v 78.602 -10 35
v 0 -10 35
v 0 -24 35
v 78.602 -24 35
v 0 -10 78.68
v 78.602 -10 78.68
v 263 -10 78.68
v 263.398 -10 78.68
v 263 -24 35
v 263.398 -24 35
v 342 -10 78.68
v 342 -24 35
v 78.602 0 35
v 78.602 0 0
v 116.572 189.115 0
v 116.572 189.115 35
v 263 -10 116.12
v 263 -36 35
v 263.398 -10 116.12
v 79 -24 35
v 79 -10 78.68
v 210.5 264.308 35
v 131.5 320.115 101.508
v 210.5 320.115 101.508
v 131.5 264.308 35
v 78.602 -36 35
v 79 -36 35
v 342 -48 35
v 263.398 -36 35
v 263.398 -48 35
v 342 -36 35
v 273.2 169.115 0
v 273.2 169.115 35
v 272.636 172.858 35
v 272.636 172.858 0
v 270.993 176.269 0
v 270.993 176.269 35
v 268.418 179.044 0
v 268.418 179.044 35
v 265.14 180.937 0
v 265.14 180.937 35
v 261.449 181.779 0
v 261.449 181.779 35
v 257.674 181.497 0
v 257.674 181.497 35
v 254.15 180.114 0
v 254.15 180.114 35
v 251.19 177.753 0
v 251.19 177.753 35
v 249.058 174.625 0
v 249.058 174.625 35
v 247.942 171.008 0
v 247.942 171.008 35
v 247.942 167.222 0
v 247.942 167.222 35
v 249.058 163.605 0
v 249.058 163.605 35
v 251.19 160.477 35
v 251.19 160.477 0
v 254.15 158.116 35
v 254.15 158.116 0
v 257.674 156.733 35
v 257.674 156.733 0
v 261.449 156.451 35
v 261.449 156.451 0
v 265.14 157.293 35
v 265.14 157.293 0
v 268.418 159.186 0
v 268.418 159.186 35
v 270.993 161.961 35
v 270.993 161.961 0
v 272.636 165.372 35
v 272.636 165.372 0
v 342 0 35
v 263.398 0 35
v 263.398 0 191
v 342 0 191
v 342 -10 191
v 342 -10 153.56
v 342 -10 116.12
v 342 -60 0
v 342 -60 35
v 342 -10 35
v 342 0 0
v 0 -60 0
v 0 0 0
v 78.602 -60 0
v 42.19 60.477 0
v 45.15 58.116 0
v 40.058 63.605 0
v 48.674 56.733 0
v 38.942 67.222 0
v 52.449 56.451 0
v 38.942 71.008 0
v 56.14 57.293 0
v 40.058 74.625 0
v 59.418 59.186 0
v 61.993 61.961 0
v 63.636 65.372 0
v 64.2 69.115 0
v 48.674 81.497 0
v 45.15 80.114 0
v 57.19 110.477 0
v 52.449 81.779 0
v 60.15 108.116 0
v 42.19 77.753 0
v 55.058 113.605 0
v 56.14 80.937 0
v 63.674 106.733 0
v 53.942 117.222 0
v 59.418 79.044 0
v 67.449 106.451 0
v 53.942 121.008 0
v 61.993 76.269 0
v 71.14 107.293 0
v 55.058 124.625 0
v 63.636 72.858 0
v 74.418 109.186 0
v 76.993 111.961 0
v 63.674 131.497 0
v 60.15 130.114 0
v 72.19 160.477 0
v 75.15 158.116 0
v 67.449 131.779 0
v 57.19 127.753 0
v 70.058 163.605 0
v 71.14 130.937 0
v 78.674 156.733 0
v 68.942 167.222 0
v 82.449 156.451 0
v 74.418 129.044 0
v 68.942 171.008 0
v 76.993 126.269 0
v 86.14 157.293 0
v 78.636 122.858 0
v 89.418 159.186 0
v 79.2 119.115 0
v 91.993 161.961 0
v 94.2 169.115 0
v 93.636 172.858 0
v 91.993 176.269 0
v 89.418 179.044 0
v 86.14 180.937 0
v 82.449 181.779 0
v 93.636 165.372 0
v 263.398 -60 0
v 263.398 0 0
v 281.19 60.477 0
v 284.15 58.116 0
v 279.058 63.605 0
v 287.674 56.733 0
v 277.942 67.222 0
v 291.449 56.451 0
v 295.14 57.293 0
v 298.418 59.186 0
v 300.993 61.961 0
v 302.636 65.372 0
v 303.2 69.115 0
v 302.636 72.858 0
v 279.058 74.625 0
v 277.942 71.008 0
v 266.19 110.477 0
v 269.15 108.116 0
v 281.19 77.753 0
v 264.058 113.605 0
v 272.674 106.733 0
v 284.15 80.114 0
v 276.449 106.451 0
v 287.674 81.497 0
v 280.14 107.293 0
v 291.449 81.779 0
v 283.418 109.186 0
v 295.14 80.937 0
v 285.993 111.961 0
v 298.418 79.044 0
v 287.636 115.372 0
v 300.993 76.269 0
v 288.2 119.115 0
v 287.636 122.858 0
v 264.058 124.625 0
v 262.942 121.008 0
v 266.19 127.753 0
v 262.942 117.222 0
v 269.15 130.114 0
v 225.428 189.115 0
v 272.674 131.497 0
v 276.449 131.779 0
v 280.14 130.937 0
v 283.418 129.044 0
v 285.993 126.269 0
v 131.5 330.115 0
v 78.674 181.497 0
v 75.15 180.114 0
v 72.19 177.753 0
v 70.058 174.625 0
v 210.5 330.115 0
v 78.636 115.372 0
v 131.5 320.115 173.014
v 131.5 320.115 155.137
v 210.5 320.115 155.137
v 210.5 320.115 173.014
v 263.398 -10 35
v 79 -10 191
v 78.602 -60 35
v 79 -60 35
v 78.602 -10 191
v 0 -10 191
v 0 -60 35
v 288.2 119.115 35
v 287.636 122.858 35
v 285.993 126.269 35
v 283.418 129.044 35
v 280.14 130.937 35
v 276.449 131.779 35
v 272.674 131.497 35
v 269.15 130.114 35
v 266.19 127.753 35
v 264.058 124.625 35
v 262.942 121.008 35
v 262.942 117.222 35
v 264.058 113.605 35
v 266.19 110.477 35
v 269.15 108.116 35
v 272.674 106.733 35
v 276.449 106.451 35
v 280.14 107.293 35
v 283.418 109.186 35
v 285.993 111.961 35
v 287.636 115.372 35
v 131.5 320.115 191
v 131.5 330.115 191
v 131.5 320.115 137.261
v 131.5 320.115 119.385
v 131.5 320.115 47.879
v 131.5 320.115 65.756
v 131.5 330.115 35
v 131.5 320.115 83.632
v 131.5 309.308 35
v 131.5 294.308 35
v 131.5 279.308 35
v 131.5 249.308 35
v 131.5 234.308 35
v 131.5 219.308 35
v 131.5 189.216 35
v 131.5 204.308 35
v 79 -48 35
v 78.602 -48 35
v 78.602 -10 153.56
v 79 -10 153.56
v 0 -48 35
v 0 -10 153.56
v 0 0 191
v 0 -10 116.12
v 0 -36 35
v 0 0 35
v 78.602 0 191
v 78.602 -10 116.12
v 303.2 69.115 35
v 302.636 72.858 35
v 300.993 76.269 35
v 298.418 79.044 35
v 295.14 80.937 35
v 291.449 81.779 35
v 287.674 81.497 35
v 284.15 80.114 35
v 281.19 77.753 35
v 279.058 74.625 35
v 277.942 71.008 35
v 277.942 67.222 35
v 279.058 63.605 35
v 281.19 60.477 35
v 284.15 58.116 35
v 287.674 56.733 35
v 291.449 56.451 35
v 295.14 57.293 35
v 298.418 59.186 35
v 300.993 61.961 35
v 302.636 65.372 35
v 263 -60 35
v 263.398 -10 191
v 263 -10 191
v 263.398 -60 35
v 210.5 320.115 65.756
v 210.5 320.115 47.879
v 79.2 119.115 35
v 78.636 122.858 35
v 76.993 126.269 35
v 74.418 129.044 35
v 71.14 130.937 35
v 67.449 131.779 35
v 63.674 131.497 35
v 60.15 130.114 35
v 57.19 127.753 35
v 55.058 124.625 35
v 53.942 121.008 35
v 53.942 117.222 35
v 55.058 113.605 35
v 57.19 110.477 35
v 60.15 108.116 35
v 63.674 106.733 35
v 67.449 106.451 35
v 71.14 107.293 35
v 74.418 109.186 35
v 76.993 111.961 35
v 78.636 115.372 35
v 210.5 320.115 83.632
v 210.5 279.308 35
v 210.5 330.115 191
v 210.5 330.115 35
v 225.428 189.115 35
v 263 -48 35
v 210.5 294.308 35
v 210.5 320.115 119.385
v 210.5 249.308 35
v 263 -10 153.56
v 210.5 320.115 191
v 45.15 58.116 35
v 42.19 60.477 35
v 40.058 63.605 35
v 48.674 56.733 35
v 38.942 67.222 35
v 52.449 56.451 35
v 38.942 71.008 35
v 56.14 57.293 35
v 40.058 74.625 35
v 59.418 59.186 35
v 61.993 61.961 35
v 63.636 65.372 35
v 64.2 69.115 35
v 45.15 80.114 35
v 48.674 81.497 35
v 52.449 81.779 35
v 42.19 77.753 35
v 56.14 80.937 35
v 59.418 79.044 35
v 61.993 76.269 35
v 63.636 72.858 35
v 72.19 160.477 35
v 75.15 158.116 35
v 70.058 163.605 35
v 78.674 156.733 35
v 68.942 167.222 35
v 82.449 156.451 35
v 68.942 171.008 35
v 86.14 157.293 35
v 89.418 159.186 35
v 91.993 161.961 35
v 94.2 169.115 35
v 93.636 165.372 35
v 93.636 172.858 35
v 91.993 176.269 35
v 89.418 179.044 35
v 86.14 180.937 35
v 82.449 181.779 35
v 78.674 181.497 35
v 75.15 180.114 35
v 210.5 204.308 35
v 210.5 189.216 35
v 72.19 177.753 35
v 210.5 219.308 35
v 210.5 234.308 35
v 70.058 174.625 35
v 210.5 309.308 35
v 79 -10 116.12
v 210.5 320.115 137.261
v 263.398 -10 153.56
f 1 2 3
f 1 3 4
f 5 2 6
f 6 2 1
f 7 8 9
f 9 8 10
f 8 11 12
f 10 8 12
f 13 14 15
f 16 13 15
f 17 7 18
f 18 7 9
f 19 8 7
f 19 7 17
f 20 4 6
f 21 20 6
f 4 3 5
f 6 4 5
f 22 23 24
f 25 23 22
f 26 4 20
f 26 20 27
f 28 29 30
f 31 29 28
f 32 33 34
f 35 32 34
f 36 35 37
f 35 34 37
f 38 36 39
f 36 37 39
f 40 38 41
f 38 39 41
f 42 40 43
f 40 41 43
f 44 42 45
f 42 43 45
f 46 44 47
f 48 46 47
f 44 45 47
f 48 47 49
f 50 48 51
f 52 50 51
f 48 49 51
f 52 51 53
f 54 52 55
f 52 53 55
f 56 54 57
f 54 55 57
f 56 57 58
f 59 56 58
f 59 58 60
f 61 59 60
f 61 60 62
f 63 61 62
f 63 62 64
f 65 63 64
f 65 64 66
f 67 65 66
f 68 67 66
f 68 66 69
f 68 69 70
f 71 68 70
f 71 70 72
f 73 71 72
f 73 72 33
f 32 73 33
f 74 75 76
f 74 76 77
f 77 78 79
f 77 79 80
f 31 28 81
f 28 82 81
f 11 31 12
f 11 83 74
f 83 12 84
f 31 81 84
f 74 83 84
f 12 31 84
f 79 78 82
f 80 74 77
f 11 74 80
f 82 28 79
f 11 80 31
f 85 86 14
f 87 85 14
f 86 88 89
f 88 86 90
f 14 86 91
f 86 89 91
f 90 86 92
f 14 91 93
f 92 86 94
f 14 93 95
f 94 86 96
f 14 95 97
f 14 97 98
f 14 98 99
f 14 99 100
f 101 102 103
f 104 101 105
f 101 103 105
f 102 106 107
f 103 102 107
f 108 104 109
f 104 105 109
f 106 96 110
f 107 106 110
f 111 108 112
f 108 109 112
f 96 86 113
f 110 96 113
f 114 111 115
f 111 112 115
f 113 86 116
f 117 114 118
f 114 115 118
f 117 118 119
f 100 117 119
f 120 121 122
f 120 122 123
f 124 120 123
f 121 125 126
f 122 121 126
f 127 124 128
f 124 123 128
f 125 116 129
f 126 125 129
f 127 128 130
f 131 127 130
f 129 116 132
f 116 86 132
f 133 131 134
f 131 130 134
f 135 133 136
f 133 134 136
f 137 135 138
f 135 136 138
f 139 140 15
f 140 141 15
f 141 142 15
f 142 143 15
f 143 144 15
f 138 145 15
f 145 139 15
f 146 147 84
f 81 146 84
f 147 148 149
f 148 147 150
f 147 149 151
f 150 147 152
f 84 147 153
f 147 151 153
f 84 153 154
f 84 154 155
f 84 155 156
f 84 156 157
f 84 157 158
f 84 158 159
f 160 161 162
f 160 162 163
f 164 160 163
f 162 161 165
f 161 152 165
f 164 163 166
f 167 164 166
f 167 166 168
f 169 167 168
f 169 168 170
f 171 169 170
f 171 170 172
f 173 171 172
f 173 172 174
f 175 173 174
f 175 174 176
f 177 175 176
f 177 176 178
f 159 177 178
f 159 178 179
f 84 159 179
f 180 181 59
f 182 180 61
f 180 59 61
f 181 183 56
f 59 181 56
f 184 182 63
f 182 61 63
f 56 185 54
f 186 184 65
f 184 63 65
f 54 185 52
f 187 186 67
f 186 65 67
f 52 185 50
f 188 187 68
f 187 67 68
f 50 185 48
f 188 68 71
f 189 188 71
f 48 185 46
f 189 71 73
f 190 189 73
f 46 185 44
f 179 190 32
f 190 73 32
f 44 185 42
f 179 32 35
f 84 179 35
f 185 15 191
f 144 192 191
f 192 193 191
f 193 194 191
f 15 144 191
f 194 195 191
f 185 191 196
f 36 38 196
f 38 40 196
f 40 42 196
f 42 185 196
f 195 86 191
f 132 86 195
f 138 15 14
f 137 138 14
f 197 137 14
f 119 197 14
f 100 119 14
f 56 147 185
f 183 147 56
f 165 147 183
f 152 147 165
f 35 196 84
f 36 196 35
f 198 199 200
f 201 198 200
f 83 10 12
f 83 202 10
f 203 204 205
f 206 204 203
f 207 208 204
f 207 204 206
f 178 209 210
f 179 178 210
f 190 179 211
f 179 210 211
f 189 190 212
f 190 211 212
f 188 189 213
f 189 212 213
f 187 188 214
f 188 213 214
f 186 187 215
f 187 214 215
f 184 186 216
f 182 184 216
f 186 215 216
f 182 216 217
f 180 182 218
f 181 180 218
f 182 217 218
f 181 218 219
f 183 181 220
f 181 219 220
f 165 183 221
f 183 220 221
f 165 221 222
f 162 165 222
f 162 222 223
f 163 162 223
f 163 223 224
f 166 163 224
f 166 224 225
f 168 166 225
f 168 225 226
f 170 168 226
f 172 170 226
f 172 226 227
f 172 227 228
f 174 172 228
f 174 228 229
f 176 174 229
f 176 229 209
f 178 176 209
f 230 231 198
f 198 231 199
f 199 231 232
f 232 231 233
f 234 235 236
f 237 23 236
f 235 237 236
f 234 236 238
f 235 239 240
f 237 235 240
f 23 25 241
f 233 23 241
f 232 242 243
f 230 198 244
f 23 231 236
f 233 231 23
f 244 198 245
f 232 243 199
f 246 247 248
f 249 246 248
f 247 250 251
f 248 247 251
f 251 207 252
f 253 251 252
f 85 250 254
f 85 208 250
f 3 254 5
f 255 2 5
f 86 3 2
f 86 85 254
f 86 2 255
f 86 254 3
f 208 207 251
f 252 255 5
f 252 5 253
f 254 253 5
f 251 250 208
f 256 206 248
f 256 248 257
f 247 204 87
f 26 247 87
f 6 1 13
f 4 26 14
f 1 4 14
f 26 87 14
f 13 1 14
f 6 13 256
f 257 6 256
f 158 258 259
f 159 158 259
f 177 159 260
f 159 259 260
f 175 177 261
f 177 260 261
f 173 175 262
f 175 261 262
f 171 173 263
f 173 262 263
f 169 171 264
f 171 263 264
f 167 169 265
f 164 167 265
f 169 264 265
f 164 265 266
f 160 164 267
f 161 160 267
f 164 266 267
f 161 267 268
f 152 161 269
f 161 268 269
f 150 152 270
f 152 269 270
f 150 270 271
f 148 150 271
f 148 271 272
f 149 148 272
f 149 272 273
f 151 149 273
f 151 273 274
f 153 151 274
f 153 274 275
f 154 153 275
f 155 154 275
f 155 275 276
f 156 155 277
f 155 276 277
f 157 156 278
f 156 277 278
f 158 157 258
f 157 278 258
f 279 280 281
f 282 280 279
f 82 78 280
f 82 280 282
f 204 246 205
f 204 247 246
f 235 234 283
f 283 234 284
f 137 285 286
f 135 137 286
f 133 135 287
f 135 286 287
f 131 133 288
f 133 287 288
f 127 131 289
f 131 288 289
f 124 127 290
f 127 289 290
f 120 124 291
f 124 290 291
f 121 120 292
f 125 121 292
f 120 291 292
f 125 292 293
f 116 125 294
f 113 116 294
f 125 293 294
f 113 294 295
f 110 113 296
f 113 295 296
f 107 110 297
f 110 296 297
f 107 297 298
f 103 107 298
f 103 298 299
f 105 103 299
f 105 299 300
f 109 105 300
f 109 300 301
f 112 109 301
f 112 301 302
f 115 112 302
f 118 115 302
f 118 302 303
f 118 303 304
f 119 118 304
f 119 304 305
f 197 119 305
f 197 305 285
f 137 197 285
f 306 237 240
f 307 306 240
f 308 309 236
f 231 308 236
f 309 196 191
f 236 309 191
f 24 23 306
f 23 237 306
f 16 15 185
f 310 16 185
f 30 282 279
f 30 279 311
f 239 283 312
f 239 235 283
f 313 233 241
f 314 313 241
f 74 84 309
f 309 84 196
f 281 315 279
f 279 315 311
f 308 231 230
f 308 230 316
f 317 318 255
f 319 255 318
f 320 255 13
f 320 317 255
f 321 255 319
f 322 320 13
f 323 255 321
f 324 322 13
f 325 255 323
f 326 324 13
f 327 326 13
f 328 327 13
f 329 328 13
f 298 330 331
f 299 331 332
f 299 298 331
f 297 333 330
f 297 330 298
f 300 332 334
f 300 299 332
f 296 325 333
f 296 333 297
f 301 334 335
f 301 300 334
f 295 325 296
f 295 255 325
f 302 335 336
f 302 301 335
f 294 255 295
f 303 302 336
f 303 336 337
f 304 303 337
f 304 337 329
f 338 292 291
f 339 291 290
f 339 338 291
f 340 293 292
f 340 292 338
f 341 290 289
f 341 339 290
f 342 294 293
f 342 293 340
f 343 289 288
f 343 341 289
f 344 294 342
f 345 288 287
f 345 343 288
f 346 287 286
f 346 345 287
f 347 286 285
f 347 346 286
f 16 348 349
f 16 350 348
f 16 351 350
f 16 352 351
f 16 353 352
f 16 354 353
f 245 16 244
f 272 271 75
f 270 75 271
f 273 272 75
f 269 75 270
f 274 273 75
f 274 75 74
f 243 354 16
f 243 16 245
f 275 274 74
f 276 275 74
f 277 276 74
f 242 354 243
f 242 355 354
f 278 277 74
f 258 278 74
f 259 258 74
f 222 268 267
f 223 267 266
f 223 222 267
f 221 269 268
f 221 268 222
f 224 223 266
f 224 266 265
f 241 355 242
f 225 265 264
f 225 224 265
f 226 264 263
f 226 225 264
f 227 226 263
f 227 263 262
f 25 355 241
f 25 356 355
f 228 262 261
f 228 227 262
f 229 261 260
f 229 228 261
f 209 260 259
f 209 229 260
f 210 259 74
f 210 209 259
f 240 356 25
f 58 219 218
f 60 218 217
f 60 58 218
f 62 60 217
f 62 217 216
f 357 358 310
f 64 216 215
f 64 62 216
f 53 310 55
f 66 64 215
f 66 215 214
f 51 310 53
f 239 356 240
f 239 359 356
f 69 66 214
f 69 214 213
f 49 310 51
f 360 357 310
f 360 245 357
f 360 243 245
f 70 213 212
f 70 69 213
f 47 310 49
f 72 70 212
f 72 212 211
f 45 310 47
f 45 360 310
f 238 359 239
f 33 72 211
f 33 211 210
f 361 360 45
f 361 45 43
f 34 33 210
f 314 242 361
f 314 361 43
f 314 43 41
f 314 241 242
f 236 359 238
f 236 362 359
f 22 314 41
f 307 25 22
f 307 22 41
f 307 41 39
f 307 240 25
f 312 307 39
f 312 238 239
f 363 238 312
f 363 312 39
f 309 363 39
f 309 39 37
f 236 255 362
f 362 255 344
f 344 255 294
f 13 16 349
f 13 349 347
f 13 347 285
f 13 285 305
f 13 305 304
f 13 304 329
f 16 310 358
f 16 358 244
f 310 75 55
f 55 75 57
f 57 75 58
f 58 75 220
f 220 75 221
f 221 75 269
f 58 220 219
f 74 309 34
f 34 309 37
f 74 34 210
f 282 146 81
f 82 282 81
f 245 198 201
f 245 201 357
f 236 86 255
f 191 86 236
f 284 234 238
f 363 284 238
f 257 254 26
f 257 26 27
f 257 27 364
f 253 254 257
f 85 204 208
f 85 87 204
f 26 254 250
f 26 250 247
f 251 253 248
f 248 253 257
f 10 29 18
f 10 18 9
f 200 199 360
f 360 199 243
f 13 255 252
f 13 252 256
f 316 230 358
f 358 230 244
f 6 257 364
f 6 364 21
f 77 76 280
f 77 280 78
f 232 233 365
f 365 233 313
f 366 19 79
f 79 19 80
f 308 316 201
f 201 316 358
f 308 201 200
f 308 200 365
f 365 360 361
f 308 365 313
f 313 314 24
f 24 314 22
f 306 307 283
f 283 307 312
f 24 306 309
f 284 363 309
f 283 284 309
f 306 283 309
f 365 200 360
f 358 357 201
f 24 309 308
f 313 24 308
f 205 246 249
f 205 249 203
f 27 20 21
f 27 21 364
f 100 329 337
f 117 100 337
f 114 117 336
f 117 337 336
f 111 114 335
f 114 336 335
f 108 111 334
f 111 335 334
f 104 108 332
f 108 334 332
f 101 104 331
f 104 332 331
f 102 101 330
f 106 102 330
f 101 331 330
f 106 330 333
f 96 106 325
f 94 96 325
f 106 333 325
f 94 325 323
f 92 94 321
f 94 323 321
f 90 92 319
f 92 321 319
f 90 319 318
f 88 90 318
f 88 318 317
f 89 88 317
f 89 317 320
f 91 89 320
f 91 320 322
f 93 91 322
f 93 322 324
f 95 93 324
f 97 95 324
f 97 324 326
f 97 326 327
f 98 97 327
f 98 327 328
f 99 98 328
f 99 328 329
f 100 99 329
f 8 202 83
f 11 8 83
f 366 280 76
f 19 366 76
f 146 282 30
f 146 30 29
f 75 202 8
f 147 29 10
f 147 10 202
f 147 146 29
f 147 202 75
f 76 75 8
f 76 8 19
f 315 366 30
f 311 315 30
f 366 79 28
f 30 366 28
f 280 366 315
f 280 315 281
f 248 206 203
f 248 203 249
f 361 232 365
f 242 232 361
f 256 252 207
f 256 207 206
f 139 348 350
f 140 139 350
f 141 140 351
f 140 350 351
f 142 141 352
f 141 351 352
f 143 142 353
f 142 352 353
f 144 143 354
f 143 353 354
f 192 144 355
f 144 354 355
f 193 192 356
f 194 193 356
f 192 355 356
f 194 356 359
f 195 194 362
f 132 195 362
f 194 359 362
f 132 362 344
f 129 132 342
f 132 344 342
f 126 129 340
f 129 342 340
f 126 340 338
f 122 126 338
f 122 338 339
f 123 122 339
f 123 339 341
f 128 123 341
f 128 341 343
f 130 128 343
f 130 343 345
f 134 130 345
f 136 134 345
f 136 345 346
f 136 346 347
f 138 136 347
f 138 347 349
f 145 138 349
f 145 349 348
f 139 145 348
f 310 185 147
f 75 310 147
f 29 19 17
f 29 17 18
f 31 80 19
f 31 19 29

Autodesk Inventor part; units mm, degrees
ref_plane "YZ Plane" through (0, 0, 0) normal (1, 0, 0) x (0, 1, 0)
ref_plane "XZ Plane" through (0, 0, 0) normal (0, 1, 0) x (-1, 0, 0)
sketch "Boceto7" plane through (0, 0, 0) normal (0, 0, 1) x (1, 0, 0)
  line L0 (0, 0) -> (342, 0)
  line L1 (171, 330.115) -> (171, 0) construction
  line L2 (131.5, 347.5309) -> (210.5, 347.5309) construction
  line L3 (210.5, 330.115) -> (131.5, 330.115)
  line L4 (0, 0) -> (131.5, 330.115)
  line L5 (342, 0) -> (210.5, 330.115)
  line L6 (0, 0) -> (0, -10) construction
  line L7 (0, -10) -> (78.602, -10) construction
  line L8 (0, -10) -> (78.602, -10)
  line L9 (0, -10) -> (0, 0)
  line L10 (78.602, -10) -> (342, -10)
  line L11 (342, -10) -> (342, 0)
  line L12 (131.5, 330.115) -> (131.5, 320.115)
  line L13 (131.5, 320.115) -> (210.5, 320.115)
  line L14 (210.5, 320.115) -> (210.5, 330.115)
  line L15 (78.602, -10) -> (78.602, 0)
  line L16 (263.398, -10) -> (263.398, 0)
  line L17 (0, -10) -> (78.602, -10)
  line L18 (78.602, -10) -> (78.602, -60)
  line L19 (78.602, -60) -> (0, -60)
  line L20 (0, -60) -> (0, -10)
  line L21 (263.398, -10) -> (263.398, -60)
  line L22 (263.398, -60) -> (342, -60)
  line L23 (342, -60) -> (342, -10)
  line L24 (78.602, 0) -> (116.5722, 189.115)
  line L25 (116.5722, 189.115) -> (225.4278, 189.115)
  line L26 (225.4278, 189.115) -> (263.398, 0)
  point P0 (263.398, 0)
  point P1 (263.398, -10)
  dimension "d68" = 79
  dimension "d69" = 39.5
  dimension "d70" = 342
  dimension "d71" = 330.115
  dimension "d72" = 10
  dimension "d73" = 78.602
  dimension "d74" = 10
  dimension "d111" = 50
  dimension "d144" = 141
extrude "Extrusión5" add sketch "Boceto7" along normal blind 35 contours L4 L12 L13 L14 L5 L0 L26 L25 L24 | L0 L15 L8 L9 | L3 L14 L13 L12 | L8 L18 L19 L20 | L0 L11 L10 L16 | L10 L23 L22 L21
extrude "Extrusión6" add sketch "Boceto7" along normal blind 191 contours L0 L15 L8 L9 | L3 L14 L13 L12 | L0 L11 L10 L16
ref_plane "Plano de trabajo2" through (171, -60, 0) normal (1, 0, 0) x (0, 0, -1)
sketch "Boceto12" plane through (171, -60, 0) normal (1, 0, 0) x (0, 0, -1)
  line L0 (-35, 380.115) -> (-191, 380.115) projected
  line L1 (-191, 380.115) -> (-35, 249.2155)
  line L2 (-35, 390.115) -> (-35, 60) projected
  line L3 (-173.0135, 380.115) -> (-35, 264.3079)
  line L4 (-173.0135, 395.115) -> (-35, 279.3079)
  line L5 (-173.0135, 410.115) -> (-35, 294.3079)
  line L6 (-173.0135, 425.115) -> (-35, 309.3079)
  line L7 (-173.0135, 440.115) -> (-35, 324.3079)
  line L8 (-173.0135, 455.115) -> (-35, 339.3079)
  line L9 (-173.0135, 470.115) -> (-35, 354.3079)
  line L10 (-173.0135, 485.115) -> (-35, 369.3079)
  line L11 (-173.0135, 500.115) -> (-35, 384.3079)
  line L12 (-173.0135, 515.115) -> (-35, 399.3079)
  line L13 (-173.0135, 530.115) -> (-35, 414.3079)
  line L14 (-35, 60) -> (-35, 390.115) projected
  line L15 (138.0135, 380.115) -> (138.0135, 210.115) construction
  point P0 (0, 60)
  point P1 (-10, 338.3304)
  point P2 (-23.0135, 325.115)
  point P3 (-12.1268, 325.115)
  point P4 (-30, 350.1124)
  point P5 (-30.0031, 385.115)
  point P6 (-47.8794, 380.115)
  point P7 (-65.7557, 380.115)
  point P8 (-83.632, 380.115)
  point P9 (-101.5083, 380.115)
  point P10 (-119.3846, 380.115)
  point P11 (-137.2609, 380.115)
  point P12 (-155.1372, 380.115)
  dimension "d90" = 40
  dimension "d93" = 15
  dimension "d107" = 170
  dimension "d108" = 0
extrude "Extrusión9" add sketch "Boceto12" along normal mid plane 79 contours L3 L2 L1 L0 | L0 L5 L2 L4 | L0 L7 L2 L6 | L0 L9 L2 L8 | L0 L2 L10
sketch "Boceto13" plane through (0, 0, 35) normal (0, 0, 1) x (1, 0, 0)
  circle A0 centre (81.5, 169.115) radius 12.7
  circle A1 centre (66.5, 119.115) radius 12.7
  circle A2 centre (51.5, 69.115) radius 12.7
  line L0 (116.5722, 189.115) -> (225.4278, 189.115) projected
  line L1 (131.5, 189.2155) -> (131.5, 320.115) projected
  line L2 (131.5, 320.115) -> (210.5, 320.115) construction
  line L3 (171, 320.115) -> (171, 34.3684) construction
  circle A3 centre (260.5, 169.115) radius 12.7
  circle A4 centre (275.5, 119.115) radius 12.7
  circle A5 centre (290.5, 69.115) radius 12.7
  point P0 (131.5, 193.411)
  dimension "d126" = 25.4
  dimension "d127" = 25.4
  dimension "d128" = 25.4
  dimension "d129" = 20
  dimension "d130" = 50
  dimension "d131" = 50
  dimension "d132" = 50
  dimension "d133" = 65
  dimension "d134" = 80
extrude "Extrusión10" cut sketch "Boceto13" against normal up to surface (35 mm away)
sketch "Boceto16" plane through (342, -60, 0) normal (1, 0, 0) x (0, 0, -1)
  line L0 (-191, 50) -> (-191, 60) projected
  line L1 (0, 0) -> (-35, 0) projected
  line L2 (-191, 50) -> (-35, 0)
  line L3 (-35, 0) -> (-35, 50) projected
  line L4 (-191, 62) -> (-35, 12)
  line L5 (-191, 74) -> (-35, 24)
  line L6 (-191, 86) -> (-35, 36)
  line L7 (-191, 98) -> (-35, 48)
  line L8 (-191, 110) -> (-35, 60)
  line L9 (-35, 50) -> (-191, 50) projected
  point P0 (0, 60)
  point P1 (-78.68, 50)
  point P2 (-116.12, 50)
  point P3 (-153.56, 50)
  dimension "d137" = 12
extrude "Extrusión13" add sketch "Boceto16" against normal blind 79 contours L9 L4 L3 L2 | L9 L6 L3 L5
mirror "Simetría2" about plane through (171, -60, 0) normal (1, 0, 0) of "Extrusión13"
thread "Rosca1" size "M26x1.5" class "6H" standard "ANSI Metric M Profile" full length
thread "Rosca2" size "M26x1.5" class "6H" standard "ANSI Metric M Profile" full length
thread "Rosca3" size "M26x1.5" class "6H" standard "ANSI Metric M Profile" full length
thread "Rosca4" size "M26x1.5" class "6H" standard "ANSI Metric M Profile" full length
thread "Rosca5" size "M26x1.5" class "6H" standard "ANSI Metric M Profile" full length
thread "Rosca6" size "M26x1.5" class "6H" standard "ANSI Metric M Profile" full length
properties part number "Soporte" material "Acero inoxidable 302 AISI"
